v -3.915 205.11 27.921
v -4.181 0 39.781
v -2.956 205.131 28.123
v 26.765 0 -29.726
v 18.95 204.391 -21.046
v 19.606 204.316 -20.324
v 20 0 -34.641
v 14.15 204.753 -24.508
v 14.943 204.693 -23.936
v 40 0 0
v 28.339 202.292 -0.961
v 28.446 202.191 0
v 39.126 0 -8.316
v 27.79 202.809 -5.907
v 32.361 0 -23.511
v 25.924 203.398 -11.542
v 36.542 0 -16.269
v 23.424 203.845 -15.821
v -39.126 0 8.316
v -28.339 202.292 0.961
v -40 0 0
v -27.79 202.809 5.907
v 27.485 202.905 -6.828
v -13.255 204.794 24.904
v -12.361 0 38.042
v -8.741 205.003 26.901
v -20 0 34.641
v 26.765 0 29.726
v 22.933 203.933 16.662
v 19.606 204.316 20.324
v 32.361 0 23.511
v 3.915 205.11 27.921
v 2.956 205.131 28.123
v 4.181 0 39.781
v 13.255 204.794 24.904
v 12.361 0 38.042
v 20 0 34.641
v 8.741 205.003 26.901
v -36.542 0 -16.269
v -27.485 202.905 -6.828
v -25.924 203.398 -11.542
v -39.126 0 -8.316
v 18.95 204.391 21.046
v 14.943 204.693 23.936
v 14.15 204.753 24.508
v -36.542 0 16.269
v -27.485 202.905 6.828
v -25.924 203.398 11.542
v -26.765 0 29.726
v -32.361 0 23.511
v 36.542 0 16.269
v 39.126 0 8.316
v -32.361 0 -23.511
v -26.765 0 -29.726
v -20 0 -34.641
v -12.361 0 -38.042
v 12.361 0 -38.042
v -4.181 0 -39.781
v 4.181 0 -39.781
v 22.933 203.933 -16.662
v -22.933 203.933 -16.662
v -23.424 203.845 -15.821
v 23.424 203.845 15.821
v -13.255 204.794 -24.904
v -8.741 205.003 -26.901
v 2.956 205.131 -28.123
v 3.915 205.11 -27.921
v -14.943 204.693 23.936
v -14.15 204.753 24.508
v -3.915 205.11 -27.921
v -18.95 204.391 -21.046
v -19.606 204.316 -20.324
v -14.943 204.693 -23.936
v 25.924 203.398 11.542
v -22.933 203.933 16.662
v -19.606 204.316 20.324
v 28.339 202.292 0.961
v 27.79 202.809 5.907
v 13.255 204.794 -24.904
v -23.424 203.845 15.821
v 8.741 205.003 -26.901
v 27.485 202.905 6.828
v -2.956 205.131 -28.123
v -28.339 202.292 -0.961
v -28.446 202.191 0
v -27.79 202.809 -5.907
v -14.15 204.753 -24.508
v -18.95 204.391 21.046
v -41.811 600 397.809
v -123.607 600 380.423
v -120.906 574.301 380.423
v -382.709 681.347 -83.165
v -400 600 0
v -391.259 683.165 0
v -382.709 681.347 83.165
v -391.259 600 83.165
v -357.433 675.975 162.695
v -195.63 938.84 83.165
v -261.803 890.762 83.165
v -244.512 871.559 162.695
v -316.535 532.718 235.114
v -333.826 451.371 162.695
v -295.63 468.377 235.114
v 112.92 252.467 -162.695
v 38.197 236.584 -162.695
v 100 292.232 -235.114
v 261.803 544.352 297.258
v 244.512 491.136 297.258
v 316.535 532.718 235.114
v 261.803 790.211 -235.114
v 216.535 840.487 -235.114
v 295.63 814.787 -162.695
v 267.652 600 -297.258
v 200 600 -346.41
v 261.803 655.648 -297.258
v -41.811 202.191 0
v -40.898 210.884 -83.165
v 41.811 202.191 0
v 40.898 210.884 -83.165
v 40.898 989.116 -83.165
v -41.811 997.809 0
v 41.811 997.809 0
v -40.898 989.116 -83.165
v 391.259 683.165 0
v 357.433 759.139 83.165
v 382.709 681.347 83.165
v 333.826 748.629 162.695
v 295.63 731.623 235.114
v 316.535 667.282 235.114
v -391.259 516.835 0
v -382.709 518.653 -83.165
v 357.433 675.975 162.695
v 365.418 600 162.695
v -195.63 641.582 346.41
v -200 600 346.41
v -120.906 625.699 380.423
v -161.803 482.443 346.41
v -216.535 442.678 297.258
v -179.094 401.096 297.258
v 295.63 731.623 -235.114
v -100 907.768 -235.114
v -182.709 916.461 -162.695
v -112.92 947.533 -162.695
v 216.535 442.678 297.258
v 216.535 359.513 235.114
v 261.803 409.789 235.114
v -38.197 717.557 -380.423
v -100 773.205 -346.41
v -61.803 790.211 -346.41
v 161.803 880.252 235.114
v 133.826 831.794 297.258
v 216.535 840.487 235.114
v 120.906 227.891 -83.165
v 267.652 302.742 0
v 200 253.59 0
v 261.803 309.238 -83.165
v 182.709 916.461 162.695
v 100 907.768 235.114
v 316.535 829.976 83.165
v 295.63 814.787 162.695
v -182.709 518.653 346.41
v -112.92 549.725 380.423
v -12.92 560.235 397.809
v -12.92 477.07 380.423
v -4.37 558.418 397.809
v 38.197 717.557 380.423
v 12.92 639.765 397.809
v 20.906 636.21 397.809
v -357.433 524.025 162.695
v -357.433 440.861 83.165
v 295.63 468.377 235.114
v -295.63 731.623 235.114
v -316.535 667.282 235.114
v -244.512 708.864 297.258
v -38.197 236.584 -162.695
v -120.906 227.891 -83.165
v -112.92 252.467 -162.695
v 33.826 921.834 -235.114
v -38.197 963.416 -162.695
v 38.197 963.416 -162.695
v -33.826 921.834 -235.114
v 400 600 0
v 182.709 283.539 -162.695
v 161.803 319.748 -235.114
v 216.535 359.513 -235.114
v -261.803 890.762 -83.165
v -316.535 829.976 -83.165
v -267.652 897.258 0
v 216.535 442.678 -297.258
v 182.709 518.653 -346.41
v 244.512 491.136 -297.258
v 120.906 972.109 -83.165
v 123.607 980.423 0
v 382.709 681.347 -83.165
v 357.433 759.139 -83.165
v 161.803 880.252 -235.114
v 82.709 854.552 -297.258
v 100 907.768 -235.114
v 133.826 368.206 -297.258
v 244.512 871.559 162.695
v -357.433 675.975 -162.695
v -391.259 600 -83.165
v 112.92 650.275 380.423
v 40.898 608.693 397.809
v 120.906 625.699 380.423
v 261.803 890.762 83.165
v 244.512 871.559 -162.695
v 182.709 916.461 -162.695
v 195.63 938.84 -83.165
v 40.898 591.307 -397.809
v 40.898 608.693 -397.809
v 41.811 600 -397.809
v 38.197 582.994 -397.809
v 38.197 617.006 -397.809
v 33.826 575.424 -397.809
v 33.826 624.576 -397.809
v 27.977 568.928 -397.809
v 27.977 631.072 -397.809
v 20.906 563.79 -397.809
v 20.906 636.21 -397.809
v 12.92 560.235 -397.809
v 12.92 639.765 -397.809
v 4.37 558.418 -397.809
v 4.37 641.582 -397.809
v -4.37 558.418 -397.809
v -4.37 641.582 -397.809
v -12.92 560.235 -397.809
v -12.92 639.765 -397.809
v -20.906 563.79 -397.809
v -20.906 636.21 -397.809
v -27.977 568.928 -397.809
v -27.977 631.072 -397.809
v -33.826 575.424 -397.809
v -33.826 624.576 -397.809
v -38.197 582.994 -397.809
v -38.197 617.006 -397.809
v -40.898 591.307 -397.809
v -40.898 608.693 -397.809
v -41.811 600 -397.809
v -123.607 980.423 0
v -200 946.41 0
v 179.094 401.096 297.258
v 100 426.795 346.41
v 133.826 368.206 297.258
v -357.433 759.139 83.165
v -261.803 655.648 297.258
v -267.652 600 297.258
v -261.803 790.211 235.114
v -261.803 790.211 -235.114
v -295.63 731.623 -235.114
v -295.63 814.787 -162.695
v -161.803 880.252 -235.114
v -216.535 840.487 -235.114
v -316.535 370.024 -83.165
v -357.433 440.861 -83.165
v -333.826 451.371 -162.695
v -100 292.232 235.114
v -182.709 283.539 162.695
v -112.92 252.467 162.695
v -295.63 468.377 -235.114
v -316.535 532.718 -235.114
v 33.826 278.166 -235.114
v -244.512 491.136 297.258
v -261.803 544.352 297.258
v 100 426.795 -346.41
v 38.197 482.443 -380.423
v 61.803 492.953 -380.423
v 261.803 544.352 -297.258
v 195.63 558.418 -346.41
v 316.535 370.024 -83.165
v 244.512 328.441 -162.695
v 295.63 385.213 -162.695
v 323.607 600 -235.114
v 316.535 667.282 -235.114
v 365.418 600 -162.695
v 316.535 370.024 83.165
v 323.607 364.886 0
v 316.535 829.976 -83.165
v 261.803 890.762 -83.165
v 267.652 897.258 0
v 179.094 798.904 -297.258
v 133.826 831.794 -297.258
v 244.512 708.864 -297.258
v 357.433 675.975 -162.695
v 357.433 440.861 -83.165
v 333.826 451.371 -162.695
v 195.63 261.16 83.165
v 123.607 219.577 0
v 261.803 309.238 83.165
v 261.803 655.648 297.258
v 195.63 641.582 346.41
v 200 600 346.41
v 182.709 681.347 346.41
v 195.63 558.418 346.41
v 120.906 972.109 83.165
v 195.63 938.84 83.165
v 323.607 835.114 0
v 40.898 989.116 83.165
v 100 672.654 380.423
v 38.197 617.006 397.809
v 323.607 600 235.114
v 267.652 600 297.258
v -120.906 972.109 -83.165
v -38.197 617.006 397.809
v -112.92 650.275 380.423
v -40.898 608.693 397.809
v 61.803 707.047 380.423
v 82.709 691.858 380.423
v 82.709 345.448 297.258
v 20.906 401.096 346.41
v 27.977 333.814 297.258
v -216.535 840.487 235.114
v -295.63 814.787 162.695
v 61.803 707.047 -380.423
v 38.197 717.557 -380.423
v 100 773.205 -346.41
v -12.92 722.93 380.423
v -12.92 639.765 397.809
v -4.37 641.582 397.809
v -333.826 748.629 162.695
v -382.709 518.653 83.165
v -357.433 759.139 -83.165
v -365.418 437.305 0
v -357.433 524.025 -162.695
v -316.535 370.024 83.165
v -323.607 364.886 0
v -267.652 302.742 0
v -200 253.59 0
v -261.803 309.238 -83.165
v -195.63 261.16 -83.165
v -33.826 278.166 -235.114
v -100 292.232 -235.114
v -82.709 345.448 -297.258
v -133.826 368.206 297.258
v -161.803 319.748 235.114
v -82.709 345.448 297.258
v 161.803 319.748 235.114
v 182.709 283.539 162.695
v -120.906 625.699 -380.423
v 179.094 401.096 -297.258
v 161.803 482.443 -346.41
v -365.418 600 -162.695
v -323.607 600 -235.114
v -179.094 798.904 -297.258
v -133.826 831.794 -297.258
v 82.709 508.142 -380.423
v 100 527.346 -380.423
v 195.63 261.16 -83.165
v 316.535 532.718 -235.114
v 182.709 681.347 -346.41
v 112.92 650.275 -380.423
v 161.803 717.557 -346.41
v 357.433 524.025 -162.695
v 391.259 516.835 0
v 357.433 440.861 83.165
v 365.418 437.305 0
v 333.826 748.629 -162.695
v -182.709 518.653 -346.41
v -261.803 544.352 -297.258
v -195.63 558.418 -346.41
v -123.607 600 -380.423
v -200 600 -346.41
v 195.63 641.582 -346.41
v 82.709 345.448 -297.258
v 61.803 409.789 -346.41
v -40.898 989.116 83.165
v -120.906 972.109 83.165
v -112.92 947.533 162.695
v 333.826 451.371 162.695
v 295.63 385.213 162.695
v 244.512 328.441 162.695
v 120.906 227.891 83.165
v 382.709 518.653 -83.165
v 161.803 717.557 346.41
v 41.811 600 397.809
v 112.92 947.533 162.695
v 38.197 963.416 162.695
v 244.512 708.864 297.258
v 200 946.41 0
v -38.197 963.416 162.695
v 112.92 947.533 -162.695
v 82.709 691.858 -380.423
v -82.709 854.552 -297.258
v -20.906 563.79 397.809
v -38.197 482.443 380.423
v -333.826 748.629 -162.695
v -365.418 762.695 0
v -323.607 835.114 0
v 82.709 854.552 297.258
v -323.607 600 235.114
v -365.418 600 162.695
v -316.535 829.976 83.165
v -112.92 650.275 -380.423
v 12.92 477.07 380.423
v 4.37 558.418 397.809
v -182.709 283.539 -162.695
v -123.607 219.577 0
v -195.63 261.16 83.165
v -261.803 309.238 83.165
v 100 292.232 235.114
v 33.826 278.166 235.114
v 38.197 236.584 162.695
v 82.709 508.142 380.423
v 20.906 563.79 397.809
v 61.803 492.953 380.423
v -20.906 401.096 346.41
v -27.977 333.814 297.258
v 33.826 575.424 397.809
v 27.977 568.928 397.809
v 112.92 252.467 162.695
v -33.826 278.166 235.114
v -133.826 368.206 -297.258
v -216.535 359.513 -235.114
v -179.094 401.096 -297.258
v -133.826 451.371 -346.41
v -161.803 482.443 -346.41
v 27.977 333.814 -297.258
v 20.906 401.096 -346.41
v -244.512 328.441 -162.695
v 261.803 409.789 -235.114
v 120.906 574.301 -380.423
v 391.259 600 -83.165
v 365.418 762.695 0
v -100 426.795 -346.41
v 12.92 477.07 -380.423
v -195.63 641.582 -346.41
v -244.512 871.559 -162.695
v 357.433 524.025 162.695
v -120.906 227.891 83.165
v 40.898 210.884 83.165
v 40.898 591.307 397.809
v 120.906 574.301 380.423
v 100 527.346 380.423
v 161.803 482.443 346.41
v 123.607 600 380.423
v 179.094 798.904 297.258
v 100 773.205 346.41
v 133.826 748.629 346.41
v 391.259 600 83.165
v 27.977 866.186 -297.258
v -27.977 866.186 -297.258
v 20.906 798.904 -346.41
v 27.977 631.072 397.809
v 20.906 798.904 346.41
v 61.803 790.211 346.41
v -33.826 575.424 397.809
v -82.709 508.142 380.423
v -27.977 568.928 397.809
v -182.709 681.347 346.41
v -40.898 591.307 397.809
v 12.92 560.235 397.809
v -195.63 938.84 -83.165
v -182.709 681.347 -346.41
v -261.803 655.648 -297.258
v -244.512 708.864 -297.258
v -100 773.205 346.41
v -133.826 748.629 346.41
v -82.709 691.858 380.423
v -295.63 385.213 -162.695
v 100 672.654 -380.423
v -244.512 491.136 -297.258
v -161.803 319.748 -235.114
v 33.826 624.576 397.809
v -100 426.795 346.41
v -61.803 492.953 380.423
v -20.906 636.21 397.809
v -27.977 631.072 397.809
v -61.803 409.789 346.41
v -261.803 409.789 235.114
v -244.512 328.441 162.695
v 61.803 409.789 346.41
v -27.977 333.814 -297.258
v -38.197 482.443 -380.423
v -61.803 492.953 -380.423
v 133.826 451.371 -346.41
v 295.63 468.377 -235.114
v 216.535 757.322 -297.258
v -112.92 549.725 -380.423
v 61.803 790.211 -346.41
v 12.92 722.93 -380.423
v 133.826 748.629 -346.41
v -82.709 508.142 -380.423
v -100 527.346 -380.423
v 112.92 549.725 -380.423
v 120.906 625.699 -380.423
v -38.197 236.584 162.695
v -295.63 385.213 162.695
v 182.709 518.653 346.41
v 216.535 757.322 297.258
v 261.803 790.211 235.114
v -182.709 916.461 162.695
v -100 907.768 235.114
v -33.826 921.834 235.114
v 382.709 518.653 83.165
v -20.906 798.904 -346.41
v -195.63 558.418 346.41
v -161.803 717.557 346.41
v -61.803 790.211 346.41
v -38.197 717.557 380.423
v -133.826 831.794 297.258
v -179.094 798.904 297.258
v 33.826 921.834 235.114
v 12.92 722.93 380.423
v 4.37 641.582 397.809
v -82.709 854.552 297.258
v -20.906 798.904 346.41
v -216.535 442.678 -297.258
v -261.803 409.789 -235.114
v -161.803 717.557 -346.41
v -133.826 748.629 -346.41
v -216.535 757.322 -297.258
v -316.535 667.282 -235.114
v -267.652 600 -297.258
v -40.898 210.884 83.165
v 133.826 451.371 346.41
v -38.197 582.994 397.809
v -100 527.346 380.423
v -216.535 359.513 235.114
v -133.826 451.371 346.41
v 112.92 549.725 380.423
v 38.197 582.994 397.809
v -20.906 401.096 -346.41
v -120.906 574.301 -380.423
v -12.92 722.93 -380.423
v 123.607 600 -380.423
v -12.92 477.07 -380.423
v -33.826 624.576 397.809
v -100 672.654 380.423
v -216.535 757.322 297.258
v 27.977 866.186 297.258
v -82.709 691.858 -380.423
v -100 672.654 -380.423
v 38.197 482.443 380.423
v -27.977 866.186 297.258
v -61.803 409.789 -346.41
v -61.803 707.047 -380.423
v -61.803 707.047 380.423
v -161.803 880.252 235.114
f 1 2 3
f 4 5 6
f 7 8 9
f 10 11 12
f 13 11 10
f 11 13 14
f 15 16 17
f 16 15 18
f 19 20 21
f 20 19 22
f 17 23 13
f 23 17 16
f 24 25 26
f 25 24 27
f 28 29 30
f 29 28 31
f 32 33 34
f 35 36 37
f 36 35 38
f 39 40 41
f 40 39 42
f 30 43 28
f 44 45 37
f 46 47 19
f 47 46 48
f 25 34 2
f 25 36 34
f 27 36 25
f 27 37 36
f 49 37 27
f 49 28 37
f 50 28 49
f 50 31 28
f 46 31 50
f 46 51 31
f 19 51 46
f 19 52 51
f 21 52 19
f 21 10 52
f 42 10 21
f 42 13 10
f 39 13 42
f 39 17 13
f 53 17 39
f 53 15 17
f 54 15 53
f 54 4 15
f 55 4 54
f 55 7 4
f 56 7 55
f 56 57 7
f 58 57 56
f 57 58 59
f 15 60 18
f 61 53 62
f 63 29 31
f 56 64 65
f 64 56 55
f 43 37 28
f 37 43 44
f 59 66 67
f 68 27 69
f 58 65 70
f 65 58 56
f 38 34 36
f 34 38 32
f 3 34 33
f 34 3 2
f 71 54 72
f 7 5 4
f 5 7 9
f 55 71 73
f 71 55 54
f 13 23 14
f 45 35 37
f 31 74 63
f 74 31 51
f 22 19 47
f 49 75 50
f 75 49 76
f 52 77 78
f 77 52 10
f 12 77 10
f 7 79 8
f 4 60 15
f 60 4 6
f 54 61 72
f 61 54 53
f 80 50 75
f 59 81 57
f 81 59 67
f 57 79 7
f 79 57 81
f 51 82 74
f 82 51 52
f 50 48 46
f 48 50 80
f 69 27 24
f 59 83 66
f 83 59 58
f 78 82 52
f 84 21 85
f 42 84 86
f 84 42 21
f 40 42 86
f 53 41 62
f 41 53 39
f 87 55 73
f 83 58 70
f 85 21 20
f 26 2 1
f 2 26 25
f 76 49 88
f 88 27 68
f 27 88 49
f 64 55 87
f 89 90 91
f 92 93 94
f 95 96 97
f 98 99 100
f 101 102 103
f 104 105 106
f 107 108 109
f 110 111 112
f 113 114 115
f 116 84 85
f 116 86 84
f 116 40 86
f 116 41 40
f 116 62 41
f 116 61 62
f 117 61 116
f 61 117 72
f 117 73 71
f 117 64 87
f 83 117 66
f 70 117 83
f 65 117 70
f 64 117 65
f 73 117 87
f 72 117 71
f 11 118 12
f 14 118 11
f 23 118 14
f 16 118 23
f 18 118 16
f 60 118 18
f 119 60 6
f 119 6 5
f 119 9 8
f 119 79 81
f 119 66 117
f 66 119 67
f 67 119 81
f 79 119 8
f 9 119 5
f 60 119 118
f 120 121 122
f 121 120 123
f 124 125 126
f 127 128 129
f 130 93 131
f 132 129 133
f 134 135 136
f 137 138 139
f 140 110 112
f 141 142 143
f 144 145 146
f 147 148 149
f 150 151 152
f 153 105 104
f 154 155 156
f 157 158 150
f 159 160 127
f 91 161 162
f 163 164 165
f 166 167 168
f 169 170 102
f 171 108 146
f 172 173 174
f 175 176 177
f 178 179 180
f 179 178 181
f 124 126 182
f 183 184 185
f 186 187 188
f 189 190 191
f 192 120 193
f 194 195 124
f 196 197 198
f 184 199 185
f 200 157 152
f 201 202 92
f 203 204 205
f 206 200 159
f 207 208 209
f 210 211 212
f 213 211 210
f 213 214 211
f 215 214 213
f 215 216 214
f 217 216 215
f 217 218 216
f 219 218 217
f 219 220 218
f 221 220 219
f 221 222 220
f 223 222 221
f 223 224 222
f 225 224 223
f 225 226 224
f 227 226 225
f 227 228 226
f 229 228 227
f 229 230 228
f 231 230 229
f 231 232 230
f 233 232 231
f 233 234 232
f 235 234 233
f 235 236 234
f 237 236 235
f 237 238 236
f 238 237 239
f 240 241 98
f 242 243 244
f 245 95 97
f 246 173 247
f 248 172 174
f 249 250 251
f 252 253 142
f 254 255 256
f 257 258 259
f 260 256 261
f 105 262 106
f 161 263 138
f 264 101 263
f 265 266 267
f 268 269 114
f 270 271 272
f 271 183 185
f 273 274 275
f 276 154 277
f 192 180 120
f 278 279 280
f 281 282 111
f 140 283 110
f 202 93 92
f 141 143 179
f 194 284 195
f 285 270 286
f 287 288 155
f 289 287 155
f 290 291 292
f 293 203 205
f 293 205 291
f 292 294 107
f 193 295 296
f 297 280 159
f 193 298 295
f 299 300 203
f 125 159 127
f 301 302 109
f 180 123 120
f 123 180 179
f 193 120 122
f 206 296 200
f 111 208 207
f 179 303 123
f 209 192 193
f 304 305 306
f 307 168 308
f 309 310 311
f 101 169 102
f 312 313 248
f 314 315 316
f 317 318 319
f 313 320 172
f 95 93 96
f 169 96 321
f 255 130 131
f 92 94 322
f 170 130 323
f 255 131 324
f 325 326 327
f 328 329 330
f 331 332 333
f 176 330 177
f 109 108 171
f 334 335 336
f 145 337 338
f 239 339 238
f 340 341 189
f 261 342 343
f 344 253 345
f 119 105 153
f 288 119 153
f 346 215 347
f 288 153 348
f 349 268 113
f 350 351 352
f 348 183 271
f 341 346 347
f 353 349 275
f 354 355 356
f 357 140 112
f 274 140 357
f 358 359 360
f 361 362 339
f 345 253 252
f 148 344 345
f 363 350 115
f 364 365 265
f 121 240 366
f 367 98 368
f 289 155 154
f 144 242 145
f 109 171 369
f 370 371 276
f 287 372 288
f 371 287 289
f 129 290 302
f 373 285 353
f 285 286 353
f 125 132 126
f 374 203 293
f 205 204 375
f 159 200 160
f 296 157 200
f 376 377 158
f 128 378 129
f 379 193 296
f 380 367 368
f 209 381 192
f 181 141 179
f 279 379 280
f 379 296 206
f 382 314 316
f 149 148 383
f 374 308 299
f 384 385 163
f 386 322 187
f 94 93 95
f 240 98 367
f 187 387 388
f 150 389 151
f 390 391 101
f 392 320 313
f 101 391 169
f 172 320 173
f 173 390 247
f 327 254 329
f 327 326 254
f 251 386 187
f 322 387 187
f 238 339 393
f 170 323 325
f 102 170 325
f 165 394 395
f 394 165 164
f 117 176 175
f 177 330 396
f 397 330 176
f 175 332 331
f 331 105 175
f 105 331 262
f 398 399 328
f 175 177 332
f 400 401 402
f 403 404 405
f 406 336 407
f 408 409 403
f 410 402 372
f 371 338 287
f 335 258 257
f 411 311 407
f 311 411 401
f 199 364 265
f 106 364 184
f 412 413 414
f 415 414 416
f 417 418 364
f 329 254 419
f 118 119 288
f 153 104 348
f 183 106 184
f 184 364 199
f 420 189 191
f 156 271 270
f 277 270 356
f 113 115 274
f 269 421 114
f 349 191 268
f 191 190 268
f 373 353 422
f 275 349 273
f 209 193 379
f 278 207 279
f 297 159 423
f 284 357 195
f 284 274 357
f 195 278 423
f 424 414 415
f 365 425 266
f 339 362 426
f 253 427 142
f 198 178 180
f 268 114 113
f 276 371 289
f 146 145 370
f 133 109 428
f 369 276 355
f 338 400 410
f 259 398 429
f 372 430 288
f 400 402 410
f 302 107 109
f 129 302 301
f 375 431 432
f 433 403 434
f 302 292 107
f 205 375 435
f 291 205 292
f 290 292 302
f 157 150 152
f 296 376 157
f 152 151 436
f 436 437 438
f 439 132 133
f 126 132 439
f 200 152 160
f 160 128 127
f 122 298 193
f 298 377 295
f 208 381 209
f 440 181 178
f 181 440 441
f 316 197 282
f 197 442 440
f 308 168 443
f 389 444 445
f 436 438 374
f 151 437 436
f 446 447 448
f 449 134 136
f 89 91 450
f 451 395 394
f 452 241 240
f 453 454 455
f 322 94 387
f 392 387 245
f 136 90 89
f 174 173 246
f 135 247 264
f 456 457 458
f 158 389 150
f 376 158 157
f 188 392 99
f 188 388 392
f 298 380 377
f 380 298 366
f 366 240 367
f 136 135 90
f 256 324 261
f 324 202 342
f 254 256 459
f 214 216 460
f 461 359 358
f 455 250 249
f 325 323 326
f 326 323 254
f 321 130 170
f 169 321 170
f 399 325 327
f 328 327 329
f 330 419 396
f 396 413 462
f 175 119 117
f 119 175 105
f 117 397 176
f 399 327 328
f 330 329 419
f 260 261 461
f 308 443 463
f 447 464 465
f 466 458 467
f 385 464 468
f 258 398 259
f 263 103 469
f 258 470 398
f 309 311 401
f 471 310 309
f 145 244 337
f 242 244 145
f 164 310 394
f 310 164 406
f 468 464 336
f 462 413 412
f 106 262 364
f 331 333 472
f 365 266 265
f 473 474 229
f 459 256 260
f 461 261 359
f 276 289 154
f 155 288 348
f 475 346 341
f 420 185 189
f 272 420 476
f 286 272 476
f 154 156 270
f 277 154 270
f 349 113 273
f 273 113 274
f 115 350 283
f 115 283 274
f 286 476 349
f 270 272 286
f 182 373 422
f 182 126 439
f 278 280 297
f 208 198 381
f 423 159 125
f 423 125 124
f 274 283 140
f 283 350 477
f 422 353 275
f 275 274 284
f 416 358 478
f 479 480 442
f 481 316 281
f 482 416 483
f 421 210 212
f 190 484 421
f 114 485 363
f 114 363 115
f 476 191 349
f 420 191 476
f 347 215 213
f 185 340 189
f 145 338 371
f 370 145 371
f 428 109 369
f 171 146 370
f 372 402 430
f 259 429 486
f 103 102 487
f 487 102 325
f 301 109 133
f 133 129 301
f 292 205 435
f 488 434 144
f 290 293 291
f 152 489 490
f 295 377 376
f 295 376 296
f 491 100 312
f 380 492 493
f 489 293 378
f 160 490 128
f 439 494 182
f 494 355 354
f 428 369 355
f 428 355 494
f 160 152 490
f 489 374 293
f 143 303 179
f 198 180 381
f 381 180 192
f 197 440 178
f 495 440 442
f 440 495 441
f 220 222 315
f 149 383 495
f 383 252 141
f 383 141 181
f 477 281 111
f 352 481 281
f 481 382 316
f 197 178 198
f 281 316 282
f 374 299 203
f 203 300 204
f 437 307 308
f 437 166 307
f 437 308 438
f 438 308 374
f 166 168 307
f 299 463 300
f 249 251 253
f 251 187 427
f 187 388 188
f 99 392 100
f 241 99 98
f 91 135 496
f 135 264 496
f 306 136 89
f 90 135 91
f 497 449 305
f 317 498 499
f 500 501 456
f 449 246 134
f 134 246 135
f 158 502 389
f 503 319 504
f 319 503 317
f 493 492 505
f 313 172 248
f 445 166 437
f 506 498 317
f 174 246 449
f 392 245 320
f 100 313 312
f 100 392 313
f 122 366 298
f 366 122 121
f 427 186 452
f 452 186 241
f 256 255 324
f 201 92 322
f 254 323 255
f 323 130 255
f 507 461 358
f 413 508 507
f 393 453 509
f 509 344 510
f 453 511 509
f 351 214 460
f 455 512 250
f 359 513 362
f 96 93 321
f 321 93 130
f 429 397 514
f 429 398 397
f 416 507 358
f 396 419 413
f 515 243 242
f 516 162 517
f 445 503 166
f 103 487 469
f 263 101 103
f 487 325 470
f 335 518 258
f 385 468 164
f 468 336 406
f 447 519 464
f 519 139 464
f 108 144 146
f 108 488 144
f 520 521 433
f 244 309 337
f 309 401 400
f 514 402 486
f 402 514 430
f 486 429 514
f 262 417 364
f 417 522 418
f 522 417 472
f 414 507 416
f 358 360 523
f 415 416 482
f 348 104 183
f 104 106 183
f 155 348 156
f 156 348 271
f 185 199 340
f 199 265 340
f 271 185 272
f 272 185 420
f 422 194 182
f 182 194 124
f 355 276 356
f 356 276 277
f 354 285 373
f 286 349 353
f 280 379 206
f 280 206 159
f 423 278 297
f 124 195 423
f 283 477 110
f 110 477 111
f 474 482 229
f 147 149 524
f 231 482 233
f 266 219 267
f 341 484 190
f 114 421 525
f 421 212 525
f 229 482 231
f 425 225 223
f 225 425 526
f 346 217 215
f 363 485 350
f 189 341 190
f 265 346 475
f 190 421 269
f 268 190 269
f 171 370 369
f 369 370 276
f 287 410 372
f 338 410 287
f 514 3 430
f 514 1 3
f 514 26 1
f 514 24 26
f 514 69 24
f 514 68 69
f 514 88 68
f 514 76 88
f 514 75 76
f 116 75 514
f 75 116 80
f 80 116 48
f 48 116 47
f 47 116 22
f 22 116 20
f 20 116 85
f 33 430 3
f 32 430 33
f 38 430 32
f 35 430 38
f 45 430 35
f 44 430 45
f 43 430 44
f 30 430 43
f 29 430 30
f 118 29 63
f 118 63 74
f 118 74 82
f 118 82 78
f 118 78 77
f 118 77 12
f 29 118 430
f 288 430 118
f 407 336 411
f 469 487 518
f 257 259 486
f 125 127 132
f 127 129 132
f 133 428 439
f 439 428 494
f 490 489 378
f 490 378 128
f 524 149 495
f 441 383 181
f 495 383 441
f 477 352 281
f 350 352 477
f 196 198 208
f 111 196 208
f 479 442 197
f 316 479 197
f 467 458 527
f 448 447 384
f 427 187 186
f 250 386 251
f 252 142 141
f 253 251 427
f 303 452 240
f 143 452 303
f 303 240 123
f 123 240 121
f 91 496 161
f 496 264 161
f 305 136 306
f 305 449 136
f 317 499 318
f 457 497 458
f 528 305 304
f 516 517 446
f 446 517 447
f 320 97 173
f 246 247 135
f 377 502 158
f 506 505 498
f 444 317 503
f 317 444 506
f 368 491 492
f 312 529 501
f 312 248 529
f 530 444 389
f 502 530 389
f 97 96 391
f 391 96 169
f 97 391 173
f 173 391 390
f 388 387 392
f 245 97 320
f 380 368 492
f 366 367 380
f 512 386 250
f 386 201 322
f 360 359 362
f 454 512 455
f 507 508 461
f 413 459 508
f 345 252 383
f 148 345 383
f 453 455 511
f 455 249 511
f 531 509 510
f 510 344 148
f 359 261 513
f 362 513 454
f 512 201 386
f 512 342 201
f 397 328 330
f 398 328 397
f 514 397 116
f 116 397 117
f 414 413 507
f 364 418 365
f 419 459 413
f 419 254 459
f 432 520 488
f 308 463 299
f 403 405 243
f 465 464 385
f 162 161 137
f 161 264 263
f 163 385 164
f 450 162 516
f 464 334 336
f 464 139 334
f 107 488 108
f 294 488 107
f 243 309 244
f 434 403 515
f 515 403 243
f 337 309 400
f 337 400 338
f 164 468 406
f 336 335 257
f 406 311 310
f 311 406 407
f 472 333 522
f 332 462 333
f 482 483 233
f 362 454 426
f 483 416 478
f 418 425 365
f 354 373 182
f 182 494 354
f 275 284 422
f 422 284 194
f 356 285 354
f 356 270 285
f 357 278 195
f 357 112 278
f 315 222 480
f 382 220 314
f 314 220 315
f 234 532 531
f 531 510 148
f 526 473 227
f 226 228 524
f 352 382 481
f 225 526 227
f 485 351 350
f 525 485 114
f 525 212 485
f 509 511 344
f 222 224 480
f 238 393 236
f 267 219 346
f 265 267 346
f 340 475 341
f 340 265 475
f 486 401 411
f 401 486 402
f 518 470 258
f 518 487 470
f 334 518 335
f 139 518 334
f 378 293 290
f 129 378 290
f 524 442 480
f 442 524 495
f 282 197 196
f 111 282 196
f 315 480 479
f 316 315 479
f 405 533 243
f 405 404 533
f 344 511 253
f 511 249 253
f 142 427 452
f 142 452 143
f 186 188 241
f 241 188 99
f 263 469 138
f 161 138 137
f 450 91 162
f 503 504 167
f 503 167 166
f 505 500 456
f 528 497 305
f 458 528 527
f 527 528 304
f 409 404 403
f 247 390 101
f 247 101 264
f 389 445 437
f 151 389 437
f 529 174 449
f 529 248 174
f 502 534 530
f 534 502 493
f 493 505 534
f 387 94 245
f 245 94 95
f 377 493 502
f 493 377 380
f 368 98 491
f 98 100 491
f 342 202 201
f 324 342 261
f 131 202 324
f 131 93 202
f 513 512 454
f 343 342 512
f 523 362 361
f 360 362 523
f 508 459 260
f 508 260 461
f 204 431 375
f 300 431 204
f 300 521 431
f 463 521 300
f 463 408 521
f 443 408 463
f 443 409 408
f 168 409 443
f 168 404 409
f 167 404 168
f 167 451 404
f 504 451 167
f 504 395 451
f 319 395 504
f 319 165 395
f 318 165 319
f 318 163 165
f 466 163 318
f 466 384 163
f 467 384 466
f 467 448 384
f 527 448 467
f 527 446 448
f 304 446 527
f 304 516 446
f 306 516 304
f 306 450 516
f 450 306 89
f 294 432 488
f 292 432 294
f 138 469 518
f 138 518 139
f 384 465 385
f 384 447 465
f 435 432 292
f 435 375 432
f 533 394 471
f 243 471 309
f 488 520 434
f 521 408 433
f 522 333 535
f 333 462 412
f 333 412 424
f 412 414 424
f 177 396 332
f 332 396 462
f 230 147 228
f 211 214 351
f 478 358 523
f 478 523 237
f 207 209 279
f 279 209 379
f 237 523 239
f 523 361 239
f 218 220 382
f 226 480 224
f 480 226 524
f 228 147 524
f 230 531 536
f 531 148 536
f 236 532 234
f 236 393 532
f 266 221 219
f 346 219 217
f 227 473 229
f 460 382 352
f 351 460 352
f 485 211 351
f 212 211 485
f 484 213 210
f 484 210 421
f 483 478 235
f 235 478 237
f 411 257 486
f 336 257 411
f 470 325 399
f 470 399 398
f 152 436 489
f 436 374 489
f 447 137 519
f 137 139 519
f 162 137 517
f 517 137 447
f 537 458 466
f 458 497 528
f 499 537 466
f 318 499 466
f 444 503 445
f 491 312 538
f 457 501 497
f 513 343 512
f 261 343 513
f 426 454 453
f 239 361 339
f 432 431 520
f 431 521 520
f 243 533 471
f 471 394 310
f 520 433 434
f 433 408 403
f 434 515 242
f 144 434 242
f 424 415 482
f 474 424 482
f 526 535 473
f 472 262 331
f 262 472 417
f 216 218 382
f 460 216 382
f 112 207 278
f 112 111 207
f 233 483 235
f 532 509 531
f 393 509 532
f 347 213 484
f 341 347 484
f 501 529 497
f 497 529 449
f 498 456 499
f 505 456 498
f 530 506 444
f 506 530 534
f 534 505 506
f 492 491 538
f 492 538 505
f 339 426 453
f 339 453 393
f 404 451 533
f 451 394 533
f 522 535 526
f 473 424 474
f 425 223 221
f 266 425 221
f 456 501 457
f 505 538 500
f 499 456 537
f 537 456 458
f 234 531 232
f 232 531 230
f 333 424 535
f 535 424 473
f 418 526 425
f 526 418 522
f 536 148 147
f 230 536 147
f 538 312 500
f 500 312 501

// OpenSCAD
module broadleafTree(height, crownRadius) {
	brown = [ 84/255, 58/255, 5/255 ];
	green = [ 176/255, 225/255, 104/255 ];

	color(brown)
		rotate([270, 0, 0])
			cylinder(height / 2, crownRadius / 20, crownRadius / 70);
	color(green)
		translate([0, height - crownRadius / 2, 0])
			sphere(crownRadius / 2);
}

broadleafTree (1000, 800);
